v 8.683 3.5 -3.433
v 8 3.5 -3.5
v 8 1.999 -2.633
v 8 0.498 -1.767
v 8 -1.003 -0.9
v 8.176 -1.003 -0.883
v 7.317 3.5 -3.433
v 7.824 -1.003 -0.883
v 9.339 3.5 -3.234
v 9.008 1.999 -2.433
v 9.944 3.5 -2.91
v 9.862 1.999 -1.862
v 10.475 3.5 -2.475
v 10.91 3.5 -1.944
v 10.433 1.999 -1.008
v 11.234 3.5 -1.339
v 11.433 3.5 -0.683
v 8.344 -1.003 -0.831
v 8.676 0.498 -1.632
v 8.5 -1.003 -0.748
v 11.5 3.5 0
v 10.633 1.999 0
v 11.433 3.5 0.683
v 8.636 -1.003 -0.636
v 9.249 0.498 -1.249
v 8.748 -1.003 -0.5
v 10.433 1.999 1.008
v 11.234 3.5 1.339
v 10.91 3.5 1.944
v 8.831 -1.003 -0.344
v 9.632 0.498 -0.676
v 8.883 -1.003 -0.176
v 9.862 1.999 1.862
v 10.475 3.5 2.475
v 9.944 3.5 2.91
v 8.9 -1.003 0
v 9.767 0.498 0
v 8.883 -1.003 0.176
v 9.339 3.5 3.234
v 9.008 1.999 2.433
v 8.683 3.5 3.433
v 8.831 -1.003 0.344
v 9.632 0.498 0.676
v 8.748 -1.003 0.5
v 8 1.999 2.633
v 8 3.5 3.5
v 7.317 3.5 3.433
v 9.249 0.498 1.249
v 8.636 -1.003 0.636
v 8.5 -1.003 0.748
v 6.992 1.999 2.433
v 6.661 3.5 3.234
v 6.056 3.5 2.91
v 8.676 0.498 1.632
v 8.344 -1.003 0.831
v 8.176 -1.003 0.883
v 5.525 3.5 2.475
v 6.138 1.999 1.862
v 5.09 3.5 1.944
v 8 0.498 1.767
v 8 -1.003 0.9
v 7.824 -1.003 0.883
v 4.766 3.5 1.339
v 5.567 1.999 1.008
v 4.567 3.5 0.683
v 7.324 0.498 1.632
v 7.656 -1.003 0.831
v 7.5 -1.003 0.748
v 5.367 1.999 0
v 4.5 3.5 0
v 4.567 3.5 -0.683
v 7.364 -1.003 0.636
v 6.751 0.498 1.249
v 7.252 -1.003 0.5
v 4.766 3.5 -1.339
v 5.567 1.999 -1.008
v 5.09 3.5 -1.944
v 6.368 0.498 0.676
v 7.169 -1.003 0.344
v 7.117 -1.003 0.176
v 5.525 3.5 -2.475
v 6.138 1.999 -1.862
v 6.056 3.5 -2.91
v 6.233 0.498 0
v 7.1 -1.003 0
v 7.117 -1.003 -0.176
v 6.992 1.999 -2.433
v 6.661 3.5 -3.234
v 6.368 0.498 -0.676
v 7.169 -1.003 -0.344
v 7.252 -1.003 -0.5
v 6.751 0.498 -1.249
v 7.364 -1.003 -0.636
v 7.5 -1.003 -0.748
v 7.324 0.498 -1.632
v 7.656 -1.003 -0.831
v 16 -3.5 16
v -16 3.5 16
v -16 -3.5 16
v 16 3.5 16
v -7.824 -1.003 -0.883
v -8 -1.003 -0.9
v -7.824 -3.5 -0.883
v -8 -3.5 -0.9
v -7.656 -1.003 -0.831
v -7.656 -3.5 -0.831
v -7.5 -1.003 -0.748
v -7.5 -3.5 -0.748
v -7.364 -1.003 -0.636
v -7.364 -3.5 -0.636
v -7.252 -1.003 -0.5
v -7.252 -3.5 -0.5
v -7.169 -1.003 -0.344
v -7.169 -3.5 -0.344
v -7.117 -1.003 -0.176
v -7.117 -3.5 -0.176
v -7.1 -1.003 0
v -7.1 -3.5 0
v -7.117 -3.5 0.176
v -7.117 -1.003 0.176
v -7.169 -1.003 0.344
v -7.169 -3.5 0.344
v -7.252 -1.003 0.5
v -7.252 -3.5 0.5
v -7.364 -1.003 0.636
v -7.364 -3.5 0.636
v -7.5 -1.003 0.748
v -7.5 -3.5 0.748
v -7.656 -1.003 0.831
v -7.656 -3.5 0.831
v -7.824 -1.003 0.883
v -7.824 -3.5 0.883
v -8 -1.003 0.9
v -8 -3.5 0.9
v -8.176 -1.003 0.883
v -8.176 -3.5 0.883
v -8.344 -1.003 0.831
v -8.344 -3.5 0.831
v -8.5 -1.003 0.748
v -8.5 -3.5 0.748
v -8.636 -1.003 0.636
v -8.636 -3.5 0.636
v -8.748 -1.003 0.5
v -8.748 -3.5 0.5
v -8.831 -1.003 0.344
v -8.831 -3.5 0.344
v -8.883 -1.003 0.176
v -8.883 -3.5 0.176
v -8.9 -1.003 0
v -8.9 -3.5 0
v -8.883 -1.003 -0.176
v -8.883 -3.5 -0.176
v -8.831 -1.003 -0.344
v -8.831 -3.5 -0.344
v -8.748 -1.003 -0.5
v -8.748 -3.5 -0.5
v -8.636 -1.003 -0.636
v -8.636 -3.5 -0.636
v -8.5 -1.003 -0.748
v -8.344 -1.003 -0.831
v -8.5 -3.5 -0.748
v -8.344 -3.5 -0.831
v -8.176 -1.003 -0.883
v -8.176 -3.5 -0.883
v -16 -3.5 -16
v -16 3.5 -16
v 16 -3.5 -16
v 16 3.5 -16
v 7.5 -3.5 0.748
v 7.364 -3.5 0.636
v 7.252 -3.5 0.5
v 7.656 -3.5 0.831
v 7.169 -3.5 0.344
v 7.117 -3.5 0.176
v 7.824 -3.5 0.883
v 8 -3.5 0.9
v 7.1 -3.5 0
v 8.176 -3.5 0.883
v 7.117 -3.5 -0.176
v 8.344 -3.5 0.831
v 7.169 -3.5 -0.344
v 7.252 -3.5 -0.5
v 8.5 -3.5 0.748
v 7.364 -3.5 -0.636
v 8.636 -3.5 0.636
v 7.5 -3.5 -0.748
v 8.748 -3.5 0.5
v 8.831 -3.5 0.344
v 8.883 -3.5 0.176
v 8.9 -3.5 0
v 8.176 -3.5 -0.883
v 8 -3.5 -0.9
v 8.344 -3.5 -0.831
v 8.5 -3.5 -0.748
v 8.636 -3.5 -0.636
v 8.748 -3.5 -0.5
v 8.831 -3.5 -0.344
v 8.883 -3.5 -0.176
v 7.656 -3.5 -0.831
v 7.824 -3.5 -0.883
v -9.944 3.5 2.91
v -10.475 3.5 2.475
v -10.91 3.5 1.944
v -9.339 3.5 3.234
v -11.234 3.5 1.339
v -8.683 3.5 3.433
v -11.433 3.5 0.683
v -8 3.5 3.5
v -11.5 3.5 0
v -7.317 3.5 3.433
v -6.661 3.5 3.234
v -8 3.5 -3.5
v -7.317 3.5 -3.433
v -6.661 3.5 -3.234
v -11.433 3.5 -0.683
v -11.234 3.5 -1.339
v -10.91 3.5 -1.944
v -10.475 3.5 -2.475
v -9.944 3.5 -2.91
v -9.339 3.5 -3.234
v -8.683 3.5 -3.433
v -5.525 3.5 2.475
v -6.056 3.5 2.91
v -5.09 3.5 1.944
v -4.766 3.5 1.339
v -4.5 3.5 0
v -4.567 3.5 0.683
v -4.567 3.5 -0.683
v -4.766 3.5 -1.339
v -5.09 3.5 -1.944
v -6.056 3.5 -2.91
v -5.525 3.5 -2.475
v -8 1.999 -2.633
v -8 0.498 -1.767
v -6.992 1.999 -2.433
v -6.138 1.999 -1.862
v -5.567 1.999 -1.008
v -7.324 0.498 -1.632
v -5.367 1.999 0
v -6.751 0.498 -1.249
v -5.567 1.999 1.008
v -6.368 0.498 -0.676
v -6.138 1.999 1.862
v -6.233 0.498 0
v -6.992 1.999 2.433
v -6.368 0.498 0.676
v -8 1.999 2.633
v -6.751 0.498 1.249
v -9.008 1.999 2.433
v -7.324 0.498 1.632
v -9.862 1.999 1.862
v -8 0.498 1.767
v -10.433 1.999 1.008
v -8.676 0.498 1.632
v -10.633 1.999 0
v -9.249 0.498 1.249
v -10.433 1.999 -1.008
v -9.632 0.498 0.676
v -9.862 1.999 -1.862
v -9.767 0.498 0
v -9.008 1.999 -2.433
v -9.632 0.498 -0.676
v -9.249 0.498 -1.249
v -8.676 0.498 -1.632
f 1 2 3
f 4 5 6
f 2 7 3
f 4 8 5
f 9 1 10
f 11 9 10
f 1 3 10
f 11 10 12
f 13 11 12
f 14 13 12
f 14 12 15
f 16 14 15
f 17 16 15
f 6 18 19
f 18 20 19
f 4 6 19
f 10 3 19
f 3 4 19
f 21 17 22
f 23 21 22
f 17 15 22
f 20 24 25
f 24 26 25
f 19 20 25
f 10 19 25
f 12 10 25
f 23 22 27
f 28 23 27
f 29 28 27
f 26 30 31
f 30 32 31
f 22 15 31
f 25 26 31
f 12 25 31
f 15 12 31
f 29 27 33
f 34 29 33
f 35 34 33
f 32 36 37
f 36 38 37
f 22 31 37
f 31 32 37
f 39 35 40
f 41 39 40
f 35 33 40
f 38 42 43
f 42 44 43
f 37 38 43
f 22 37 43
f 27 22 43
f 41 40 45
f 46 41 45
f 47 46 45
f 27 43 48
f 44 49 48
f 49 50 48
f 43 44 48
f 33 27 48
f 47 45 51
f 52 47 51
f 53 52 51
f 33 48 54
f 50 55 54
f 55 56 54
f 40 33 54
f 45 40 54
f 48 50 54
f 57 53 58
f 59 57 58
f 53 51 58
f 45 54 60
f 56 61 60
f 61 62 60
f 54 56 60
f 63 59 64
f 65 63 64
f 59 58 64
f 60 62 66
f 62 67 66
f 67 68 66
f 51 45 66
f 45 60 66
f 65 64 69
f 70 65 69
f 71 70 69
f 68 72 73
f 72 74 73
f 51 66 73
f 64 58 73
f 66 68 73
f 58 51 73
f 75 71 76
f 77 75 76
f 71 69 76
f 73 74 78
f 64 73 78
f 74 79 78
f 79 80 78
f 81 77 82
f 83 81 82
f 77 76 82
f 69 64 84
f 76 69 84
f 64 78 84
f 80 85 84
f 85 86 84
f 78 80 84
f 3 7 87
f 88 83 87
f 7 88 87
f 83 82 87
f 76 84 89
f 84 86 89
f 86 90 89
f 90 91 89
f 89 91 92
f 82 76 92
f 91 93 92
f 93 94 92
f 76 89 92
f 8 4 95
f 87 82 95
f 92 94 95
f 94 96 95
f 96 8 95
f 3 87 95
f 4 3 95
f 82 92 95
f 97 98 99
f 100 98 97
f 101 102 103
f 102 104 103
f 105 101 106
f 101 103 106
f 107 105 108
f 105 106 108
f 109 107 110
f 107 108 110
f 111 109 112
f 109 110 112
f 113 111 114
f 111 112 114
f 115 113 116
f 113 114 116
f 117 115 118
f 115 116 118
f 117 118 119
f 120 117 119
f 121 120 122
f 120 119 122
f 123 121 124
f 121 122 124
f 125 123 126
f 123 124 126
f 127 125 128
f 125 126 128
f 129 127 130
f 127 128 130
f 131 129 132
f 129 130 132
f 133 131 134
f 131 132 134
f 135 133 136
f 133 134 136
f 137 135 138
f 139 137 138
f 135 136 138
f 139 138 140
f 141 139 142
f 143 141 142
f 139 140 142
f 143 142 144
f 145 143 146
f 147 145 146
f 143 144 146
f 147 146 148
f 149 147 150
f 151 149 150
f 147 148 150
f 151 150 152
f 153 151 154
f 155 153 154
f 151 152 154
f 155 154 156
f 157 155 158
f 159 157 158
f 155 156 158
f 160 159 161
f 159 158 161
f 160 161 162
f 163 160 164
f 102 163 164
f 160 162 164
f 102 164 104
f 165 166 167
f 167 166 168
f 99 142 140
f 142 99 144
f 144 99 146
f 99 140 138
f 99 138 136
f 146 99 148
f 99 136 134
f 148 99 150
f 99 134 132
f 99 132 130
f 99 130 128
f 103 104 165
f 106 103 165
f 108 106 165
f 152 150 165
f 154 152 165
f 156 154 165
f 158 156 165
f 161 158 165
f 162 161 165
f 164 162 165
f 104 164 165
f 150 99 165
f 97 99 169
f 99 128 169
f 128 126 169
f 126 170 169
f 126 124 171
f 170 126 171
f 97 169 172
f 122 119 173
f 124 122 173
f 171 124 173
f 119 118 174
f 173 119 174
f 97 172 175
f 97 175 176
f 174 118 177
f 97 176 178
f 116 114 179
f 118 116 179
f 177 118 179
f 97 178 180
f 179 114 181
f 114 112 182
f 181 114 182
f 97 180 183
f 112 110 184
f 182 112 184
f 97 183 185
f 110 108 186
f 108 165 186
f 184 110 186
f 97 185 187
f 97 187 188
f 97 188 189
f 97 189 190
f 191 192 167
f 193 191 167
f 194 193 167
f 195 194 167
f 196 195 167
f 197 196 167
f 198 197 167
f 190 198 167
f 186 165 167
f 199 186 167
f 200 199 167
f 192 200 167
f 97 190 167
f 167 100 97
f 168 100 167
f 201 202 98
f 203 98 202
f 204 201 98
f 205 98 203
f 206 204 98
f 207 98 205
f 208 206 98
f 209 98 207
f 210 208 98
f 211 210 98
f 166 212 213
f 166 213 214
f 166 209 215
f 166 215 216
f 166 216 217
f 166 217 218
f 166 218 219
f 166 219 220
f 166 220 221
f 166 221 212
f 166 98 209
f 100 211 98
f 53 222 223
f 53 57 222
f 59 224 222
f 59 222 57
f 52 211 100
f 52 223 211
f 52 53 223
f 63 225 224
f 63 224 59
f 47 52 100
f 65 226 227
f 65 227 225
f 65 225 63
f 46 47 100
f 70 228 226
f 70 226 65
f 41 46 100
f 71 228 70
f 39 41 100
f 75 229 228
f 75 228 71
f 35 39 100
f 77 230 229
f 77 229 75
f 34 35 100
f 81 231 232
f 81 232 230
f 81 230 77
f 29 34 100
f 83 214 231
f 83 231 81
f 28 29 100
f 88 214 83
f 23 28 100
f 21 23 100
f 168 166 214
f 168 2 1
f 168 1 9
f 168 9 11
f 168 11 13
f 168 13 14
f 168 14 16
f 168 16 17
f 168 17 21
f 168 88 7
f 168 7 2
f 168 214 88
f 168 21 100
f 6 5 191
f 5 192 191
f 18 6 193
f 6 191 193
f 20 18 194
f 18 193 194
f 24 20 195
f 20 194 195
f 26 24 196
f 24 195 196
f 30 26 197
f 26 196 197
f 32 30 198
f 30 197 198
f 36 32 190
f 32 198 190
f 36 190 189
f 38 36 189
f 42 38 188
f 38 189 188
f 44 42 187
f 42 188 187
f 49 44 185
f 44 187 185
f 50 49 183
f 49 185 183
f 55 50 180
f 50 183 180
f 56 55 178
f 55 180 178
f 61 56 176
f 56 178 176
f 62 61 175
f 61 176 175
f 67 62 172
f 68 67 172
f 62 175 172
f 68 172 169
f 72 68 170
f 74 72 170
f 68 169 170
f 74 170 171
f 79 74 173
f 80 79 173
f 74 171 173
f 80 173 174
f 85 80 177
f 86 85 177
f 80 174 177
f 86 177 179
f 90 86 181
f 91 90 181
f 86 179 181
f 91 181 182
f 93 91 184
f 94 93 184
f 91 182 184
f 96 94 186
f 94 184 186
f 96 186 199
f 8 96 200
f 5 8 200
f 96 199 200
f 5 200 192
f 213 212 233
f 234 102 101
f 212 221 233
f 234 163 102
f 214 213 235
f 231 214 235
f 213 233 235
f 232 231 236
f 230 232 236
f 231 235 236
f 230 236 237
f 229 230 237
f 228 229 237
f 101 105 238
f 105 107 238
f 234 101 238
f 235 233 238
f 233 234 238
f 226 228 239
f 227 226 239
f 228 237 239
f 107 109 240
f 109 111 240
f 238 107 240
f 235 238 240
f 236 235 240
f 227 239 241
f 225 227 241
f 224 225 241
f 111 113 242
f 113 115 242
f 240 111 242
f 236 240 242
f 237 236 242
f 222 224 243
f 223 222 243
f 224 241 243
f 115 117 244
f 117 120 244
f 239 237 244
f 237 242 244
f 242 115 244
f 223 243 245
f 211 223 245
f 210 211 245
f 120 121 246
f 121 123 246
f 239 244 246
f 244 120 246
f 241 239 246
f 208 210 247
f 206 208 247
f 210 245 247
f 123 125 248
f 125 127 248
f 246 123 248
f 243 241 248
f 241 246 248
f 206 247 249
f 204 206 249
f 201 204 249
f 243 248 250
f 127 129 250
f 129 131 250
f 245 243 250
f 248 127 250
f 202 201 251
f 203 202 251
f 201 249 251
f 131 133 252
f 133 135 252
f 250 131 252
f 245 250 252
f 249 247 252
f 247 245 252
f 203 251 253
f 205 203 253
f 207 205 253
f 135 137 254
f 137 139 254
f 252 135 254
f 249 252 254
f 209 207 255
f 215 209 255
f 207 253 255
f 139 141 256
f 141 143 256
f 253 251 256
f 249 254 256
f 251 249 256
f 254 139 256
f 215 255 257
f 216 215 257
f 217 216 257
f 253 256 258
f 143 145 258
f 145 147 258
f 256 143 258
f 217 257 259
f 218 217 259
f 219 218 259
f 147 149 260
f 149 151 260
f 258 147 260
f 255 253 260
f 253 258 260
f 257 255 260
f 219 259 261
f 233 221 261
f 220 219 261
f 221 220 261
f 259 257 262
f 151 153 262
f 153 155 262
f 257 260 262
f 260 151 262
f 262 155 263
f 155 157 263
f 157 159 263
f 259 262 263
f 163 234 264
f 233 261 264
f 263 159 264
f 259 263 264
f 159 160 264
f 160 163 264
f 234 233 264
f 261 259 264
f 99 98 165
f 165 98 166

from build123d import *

# Parameters (mm, degrees)
SKETCH1_W                                            = 32
SKETCH1_H                                            = 32
BOSS_EXTRUDE1_DEPTH                                  = 3.5
CSK_FOR_M1_6_COUNTERSUNK_FLAT_HEAD_SCREW_D           = 1.8
CSK_FOR_M1_6_COUNTERSUNK_FLAT_HEAD_SCREW_CSINK_D     = 7
CSK_FOR_M1_6_COUNTERSUNK_FLAT_HEAD_SCREW_CSINK_ANGLE = 60


with BuildPart() as part:
    # Sketch1 → Boss-Extrude1 (new, symmetric)
    with BuildSketch(Plane(origin=(0, 0, 0), x_dir=(1, 0, 0), z_dir=(0, 1, 0))):
        Rectangle(SKETCH1_W, SKETCH1_H)
    extrude(amount=BOSS_EXTRUDE1_DEPTH, both=True)

    # CSK for M1.6 Countersunk Flat Head Screw1 (through all)
    with Locations(Plane(origin=(8, 3.5, 0), x_dir=(0, 0, 1), z_dir=(0, 1, 0))):
        with Locations((0, 0), (0, -16)):
            CounterSinkHole(CSK_FOR_M1_6_COUNTERSUNK_FLAT_HEAD_SCREW_D / 2, CSK_FOR_M1_6_COUNTERSUNK_FLAT_HEAD_SCREW_CSINK_D / 2, counter_sink_angle=CSK_FOR_M1_6_COUNTERSUNK_FLAT_HEAD_SCREW_CSINK_ANGLE)


solid = part.part
